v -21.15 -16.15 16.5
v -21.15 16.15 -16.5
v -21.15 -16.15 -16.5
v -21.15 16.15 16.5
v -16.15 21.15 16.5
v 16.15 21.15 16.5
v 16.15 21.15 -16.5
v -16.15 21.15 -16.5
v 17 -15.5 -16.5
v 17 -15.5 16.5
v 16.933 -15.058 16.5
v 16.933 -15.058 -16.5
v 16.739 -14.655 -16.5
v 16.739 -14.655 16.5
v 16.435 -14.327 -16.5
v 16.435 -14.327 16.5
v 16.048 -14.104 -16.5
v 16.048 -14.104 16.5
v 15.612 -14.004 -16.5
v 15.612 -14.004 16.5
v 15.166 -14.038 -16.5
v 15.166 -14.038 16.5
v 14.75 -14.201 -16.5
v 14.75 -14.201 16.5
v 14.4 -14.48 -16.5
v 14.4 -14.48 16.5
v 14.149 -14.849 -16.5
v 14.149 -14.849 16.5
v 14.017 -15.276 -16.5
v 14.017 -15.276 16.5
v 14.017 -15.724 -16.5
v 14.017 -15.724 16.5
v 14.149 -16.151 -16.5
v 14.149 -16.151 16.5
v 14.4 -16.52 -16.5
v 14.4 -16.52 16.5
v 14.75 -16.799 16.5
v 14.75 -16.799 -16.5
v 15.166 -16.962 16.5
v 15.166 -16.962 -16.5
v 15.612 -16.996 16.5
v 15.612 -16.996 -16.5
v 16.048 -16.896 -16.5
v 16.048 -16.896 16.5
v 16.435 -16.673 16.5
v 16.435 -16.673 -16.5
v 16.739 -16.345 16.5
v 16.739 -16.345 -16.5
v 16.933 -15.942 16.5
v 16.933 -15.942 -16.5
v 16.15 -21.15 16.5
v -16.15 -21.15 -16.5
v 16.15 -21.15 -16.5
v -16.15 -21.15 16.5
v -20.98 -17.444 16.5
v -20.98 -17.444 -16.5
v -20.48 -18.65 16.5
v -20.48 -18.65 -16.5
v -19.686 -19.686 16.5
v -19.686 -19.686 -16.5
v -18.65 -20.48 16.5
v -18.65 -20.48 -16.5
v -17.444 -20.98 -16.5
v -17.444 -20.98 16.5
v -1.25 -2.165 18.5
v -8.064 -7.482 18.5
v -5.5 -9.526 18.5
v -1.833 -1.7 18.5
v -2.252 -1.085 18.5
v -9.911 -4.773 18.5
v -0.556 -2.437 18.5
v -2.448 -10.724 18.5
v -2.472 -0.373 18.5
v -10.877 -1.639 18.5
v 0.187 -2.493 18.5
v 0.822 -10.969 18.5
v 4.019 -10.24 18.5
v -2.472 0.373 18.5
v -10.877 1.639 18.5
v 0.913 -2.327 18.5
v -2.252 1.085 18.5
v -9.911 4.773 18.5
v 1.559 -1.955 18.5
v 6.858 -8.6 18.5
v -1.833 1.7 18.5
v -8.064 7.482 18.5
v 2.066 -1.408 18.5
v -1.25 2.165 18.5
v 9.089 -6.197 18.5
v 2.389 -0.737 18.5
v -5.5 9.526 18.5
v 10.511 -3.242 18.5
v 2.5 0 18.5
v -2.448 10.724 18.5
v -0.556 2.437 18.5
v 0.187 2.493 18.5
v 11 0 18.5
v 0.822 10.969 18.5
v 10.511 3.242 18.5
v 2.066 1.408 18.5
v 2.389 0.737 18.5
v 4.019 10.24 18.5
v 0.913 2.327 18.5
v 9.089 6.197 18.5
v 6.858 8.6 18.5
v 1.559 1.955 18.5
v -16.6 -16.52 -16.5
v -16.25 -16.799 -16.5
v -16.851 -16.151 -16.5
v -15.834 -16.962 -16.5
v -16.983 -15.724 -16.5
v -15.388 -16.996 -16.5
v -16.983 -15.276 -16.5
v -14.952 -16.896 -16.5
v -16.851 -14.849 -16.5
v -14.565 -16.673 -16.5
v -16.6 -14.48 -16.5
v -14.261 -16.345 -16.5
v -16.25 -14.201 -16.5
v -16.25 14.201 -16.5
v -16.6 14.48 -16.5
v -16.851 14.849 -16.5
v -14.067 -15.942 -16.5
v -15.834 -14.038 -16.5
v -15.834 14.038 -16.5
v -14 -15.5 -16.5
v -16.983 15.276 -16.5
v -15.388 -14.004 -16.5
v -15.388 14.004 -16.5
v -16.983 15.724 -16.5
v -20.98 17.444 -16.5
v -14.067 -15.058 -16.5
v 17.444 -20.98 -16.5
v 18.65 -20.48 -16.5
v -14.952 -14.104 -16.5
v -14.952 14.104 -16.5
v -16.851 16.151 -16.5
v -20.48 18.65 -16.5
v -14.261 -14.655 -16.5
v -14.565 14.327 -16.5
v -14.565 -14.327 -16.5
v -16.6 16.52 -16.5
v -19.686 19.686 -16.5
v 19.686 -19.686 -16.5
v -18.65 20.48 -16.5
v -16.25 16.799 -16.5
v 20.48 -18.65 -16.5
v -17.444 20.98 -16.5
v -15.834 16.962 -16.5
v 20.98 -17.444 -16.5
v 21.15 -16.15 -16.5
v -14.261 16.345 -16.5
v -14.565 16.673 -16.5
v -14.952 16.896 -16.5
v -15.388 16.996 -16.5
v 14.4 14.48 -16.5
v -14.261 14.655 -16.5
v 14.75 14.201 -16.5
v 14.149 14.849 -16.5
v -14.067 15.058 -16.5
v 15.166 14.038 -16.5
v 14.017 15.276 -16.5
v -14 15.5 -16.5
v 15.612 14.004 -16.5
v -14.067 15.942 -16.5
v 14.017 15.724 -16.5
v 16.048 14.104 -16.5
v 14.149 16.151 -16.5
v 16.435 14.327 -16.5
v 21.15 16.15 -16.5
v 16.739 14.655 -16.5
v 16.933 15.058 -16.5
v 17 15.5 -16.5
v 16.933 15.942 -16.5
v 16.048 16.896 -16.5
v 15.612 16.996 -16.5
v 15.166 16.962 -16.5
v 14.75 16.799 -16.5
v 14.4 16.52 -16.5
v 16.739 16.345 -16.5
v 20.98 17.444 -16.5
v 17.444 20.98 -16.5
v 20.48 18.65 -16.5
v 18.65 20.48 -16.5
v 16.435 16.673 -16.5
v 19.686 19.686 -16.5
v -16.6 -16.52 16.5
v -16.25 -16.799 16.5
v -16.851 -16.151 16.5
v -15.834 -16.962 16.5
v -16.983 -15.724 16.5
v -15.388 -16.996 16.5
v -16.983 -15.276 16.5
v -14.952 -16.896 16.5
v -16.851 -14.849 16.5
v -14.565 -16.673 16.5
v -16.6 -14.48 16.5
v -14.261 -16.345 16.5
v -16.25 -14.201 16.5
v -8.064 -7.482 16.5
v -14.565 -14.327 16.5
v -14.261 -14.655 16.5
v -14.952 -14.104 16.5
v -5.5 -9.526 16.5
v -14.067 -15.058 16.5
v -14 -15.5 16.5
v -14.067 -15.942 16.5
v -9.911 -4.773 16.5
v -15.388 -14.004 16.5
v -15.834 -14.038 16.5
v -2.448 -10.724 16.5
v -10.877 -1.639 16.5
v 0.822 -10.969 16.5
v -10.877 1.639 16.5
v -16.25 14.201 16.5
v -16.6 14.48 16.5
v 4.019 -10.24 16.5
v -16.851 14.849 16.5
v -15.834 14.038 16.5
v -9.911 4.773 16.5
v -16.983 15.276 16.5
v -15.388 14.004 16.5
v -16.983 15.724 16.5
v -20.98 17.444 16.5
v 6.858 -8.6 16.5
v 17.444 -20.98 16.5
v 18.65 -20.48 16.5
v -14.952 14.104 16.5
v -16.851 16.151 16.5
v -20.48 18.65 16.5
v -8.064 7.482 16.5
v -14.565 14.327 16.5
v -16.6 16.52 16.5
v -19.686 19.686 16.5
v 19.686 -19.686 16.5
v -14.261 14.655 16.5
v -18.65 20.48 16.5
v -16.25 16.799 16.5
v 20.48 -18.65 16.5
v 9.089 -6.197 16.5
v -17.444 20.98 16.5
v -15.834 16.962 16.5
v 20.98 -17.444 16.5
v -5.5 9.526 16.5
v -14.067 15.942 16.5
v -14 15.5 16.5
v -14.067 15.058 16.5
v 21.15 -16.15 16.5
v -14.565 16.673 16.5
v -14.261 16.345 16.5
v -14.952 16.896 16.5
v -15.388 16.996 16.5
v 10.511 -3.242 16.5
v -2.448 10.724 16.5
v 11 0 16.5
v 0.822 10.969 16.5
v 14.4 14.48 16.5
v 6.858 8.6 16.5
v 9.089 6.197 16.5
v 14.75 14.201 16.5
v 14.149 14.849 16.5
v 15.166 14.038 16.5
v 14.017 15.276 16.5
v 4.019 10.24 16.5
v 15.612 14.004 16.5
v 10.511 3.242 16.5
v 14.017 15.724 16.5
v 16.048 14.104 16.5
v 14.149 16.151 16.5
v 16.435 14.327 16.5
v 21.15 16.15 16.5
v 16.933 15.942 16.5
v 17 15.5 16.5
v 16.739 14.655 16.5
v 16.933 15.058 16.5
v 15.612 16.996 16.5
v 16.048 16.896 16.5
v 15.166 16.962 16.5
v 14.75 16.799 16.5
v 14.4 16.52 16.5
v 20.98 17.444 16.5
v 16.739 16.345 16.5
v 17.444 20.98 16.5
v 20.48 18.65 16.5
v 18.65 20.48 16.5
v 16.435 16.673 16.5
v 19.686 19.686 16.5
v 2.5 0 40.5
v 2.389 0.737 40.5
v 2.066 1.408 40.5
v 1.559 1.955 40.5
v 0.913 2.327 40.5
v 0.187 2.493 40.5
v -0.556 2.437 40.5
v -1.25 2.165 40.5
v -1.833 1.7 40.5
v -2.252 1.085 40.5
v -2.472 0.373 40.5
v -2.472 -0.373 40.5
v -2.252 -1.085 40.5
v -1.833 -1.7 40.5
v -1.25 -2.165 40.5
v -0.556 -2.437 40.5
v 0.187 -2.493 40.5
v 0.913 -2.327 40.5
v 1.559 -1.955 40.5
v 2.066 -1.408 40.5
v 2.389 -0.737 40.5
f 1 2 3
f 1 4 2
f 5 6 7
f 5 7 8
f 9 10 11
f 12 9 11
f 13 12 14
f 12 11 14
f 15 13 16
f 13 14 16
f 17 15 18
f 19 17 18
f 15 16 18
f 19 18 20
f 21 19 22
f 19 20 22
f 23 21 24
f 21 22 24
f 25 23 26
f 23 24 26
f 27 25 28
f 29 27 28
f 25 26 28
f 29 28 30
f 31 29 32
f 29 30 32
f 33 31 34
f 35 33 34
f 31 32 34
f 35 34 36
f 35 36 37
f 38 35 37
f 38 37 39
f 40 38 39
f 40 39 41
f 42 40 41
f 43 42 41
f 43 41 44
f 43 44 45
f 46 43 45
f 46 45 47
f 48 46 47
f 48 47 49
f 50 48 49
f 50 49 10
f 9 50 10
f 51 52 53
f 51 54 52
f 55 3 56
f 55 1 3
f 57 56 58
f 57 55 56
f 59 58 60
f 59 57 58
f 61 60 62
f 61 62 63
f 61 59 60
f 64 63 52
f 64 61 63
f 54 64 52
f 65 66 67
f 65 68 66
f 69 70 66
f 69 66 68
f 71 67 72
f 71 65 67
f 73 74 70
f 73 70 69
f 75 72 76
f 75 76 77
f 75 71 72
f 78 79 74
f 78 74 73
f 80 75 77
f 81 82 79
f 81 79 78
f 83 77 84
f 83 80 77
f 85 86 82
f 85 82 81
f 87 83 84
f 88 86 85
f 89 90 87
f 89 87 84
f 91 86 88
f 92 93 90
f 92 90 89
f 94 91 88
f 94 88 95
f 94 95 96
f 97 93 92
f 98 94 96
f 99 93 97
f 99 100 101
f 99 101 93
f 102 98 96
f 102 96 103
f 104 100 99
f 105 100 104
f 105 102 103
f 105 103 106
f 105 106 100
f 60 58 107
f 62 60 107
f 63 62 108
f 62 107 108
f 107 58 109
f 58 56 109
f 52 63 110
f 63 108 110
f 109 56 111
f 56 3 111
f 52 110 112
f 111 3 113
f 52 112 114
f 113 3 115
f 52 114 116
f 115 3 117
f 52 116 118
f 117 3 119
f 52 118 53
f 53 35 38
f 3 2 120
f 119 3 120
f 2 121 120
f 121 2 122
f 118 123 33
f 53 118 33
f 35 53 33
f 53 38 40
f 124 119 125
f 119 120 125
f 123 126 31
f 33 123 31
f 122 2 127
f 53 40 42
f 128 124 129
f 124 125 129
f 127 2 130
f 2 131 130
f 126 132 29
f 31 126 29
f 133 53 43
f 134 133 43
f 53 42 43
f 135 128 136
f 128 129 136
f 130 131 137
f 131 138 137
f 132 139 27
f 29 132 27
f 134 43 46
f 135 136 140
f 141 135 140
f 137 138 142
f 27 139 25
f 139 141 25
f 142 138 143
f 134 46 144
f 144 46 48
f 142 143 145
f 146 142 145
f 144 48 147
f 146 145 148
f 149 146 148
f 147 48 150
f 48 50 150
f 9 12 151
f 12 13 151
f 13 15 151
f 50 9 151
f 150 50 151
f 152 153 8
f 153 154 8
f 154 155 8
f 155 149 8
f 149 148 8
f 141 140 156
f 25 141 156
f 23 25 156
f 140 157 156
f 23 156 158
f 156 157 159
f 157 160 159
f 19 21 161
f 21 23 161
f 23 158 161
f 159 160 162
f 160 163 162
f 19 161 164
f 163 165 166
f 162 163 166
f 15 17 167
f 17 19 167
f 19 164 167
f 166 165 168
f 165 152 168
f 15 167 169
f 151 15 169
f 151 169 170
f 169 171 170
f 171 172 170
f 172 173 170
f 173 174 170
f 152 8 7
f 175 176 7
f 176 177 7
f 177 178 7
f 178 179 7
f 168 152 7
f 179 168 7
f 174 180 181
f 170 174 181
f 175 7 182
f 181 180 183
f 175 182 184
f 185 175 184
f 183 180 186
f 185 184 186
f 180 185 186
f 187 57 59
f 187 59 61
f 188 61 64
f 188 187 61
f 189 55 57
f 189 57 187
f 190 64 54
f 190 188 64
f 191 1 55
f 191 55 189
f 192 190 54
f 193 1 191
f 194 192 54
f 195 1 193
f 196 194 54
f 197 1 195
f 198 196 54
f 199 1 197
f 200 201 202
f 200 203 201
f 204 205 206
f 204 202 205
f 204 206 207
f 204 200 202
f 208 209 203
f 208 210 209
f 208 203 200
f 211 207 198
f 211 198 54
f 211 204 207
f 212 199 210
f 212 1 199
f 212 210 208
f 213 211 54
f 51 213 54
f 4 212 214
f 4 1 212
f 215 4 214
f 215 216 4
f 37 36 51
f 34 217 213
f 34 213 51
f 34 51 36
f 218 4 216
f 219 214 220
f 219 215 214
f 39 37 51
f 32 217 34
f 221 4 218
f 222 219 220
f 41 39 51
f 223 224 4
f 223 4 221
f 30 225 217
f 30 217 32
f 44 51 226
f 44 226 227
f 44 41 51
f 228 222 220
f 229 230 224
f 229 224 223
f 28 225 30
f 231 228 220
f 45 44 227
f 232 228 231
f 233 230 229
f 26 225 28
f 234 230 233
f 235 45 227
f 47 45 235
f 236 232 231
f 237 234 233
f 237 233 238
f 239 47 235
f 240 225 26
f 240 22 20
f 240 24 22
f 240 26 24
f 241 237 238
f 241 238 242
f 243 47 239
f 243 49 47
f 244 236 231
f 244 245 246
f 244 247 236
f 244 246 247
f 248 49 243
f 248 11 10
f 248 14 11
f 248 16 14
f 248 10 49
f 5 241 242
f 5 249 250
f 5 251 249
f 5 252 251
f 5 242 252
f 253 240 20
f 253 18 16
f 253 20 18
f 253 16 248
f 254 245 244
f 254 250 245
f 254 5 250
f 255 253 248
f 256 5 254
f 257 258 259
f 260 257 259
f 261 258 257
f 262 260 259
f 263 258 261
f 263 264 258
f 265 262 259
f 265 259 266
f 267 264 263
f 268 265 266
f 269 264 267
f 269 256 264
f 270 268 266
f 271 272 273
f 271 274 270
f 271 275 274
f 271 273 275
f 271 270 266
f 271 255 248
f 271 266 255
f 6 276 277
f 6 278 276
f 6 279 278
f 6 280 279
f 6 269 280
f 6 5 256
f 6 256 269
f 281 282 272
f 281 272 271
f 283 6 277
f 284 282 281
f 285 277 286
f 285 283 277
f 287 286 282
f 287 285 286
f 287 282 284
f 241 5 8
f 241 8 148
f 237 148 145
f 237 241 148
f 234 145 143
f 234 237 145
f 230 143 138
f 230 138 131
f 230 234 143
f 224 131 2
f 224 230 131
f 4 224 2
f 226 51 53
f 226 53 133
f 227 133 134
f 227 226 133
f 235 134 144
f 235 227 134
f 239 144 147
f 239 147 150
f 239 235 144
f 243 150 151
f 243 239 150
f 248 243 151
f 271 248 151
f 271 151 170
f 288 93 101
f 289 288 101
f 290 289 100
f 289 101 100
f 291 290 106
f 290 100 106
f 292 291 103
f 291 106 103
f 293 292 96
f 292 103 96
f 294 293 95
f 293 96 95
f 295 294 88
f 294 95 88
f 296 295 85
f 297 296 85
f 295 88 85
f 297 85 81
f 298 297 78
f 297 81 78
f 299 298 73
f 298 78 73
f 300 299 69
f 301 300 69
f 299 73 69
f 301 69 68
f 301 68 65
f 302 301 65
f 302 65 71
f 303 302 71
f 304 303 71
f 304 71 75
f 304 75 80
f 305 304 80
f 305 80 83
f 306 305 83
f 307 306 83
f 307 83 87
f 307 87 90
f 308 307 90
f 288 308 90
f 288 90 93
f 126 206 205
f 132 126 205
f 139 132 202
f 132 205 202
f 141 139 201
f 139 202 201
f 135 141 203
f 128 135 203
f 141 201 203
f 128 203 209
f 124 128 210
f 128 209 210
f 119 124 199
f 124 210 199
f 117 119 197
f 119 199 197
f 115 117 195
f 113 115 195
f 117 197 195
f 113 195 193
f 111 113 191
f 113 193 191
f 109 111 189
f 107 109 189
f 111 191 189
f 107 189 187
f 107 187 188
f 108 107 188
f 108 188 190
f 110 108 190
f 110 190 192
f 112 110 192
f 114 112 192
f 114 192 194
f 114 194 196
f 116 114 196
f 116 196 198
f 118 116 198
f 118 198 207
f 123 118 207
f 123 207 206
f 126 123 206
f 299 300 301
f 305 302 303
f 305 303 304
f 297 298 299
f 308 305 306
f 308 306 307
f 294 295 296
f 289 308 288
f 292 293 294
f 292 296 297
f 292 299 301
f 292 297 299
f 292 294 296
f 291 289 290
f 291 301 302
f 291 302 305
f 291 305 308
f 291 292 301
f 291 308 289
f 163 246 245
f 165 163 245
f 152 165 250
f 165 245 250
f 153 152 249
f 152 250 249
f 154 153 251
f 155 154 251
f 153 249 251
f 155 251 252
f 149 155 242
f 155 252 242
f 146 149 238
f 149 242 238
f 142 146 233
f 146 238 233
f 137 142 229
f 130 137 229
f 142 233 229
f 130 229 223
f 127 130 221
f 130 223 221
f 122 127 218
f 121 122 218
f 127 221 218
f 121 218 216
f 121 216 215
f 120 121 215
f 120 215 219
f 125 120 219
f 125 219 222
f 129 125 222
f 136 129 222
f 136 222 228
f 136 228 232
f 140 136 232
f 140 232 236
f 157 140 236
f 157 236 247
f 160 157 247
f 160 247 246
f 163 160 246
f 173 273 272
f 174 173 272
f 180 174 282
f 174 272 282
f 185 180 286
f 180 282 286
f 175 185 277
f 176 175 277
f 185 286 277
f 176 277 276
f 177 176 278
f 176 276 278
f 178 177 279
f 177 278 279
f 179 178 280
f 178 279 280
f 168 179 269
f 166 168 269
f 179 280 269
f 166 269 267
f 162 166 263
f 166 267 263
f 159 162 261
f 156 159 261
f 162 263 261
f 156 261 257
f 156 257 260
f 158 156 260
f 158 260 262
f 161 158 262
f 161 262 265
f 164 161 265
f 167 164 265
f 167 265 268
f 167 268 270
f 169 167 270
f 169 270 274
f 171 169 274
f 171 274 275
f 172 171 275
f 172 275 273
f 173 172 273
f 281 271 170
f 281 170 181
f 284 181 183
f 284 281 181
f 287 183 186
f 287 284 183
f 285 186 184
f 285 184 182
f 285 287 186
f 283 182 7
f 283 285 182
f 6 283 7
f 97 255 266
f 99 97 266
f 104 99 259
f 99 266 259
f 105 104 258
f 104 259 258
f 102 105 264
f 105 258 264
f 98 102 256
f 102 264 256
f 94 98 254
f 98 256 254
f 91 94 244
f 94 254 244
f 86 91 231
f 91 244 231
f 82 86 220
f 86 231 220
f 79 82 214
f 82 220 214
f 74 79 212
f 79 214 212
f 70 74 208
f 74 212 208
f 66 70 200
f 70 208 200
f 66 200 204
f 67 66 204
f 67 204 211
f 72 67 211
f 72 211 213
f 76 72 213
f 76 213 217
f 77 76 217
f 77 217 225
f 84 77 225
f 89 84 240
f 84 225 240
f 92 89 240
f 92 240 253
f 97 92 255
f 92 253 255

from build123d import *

# Parameters (mm, degrees)
BOSS_EXTRUDE1_DEPTH = 16.5
SKETCH5_R           = 1.5
CUT_EXTRUDE1_DEPTH  = 34
SKETCH2_R           = 2.5
BOSS_EXTRUDE2_DEPTH = 24
SKETCH3_R           = 11
BOSS_EXTRUDE3_DEPTH = 2


with BuildPart() as part:
    # Sketch1 → Boss-Extrude1 (new body, symmetric)
    with BuildSketch(Plane.XY):
        with BuildLine():
            Line((-16.15, -21.15), (16.15, -21.15))
            ThreePointArc((16.15, -21.15), (19.685533906, -19.685533906), (21.15, -16.15))
            Line((21.15, -16.15), (21.15, 16.15))
            ThreePointArc((21.15, 16.15), (19.685533906, 19.685533906), (16.15, 21.15))
            Line((16.15, 21.15), (-16.15, 21.15))
            ThreePointArc((-16.15, 21.15), (-19.685533906, 19.685533906), (-21.15, 16.15))
            Line((-21.15, 16.15), (-21.15, -16.15))
            ThreePointArc((-21.15, -16.15), (-19.685533906, -19.685533906), (-16.15, -21.15))
        make_face()
    extrude(amount=BOSS_EXTRUDE1_DEPTH, both=True)

    # Sketch5 → Cut-Extrude1 (cut, through all)
    with BuildSketch(Plane.XY.offset(16.5)):
        with Locations((-15.5, 15.5)):
            Circle(SKETCH5_R)
        with Locations((15.5, 15.5)):
            Circle(SKETCH5_R)
        with Locations((15.5, -15.5)):
            Circle(SKETCH5_R)
        with Locations((-15.5, -15.5)):
            Circle(SKETCH5_R)
    extrude(amount=-CUT_EXTRUDE1_DEPTH, mode=Mode.SUBTRACT)

    # Sketch2 → Boss-Extrude2 (add)
    with BuildSketch(Plane.XY.offset(16.5)):
        Circle(SKETCH2_R)
    extrude(amount=BOSS_EXTRUDE2_DEPTH)

    # Sketch3 → Boss-Extrude3 (add)
    with BuildSketch(Plane.XY.offset(16.5)):
        Circle(SKETCH3_R)
    extrude(amount=BOSS_EXTRUDE3_DEPTH)


solid = part.part
